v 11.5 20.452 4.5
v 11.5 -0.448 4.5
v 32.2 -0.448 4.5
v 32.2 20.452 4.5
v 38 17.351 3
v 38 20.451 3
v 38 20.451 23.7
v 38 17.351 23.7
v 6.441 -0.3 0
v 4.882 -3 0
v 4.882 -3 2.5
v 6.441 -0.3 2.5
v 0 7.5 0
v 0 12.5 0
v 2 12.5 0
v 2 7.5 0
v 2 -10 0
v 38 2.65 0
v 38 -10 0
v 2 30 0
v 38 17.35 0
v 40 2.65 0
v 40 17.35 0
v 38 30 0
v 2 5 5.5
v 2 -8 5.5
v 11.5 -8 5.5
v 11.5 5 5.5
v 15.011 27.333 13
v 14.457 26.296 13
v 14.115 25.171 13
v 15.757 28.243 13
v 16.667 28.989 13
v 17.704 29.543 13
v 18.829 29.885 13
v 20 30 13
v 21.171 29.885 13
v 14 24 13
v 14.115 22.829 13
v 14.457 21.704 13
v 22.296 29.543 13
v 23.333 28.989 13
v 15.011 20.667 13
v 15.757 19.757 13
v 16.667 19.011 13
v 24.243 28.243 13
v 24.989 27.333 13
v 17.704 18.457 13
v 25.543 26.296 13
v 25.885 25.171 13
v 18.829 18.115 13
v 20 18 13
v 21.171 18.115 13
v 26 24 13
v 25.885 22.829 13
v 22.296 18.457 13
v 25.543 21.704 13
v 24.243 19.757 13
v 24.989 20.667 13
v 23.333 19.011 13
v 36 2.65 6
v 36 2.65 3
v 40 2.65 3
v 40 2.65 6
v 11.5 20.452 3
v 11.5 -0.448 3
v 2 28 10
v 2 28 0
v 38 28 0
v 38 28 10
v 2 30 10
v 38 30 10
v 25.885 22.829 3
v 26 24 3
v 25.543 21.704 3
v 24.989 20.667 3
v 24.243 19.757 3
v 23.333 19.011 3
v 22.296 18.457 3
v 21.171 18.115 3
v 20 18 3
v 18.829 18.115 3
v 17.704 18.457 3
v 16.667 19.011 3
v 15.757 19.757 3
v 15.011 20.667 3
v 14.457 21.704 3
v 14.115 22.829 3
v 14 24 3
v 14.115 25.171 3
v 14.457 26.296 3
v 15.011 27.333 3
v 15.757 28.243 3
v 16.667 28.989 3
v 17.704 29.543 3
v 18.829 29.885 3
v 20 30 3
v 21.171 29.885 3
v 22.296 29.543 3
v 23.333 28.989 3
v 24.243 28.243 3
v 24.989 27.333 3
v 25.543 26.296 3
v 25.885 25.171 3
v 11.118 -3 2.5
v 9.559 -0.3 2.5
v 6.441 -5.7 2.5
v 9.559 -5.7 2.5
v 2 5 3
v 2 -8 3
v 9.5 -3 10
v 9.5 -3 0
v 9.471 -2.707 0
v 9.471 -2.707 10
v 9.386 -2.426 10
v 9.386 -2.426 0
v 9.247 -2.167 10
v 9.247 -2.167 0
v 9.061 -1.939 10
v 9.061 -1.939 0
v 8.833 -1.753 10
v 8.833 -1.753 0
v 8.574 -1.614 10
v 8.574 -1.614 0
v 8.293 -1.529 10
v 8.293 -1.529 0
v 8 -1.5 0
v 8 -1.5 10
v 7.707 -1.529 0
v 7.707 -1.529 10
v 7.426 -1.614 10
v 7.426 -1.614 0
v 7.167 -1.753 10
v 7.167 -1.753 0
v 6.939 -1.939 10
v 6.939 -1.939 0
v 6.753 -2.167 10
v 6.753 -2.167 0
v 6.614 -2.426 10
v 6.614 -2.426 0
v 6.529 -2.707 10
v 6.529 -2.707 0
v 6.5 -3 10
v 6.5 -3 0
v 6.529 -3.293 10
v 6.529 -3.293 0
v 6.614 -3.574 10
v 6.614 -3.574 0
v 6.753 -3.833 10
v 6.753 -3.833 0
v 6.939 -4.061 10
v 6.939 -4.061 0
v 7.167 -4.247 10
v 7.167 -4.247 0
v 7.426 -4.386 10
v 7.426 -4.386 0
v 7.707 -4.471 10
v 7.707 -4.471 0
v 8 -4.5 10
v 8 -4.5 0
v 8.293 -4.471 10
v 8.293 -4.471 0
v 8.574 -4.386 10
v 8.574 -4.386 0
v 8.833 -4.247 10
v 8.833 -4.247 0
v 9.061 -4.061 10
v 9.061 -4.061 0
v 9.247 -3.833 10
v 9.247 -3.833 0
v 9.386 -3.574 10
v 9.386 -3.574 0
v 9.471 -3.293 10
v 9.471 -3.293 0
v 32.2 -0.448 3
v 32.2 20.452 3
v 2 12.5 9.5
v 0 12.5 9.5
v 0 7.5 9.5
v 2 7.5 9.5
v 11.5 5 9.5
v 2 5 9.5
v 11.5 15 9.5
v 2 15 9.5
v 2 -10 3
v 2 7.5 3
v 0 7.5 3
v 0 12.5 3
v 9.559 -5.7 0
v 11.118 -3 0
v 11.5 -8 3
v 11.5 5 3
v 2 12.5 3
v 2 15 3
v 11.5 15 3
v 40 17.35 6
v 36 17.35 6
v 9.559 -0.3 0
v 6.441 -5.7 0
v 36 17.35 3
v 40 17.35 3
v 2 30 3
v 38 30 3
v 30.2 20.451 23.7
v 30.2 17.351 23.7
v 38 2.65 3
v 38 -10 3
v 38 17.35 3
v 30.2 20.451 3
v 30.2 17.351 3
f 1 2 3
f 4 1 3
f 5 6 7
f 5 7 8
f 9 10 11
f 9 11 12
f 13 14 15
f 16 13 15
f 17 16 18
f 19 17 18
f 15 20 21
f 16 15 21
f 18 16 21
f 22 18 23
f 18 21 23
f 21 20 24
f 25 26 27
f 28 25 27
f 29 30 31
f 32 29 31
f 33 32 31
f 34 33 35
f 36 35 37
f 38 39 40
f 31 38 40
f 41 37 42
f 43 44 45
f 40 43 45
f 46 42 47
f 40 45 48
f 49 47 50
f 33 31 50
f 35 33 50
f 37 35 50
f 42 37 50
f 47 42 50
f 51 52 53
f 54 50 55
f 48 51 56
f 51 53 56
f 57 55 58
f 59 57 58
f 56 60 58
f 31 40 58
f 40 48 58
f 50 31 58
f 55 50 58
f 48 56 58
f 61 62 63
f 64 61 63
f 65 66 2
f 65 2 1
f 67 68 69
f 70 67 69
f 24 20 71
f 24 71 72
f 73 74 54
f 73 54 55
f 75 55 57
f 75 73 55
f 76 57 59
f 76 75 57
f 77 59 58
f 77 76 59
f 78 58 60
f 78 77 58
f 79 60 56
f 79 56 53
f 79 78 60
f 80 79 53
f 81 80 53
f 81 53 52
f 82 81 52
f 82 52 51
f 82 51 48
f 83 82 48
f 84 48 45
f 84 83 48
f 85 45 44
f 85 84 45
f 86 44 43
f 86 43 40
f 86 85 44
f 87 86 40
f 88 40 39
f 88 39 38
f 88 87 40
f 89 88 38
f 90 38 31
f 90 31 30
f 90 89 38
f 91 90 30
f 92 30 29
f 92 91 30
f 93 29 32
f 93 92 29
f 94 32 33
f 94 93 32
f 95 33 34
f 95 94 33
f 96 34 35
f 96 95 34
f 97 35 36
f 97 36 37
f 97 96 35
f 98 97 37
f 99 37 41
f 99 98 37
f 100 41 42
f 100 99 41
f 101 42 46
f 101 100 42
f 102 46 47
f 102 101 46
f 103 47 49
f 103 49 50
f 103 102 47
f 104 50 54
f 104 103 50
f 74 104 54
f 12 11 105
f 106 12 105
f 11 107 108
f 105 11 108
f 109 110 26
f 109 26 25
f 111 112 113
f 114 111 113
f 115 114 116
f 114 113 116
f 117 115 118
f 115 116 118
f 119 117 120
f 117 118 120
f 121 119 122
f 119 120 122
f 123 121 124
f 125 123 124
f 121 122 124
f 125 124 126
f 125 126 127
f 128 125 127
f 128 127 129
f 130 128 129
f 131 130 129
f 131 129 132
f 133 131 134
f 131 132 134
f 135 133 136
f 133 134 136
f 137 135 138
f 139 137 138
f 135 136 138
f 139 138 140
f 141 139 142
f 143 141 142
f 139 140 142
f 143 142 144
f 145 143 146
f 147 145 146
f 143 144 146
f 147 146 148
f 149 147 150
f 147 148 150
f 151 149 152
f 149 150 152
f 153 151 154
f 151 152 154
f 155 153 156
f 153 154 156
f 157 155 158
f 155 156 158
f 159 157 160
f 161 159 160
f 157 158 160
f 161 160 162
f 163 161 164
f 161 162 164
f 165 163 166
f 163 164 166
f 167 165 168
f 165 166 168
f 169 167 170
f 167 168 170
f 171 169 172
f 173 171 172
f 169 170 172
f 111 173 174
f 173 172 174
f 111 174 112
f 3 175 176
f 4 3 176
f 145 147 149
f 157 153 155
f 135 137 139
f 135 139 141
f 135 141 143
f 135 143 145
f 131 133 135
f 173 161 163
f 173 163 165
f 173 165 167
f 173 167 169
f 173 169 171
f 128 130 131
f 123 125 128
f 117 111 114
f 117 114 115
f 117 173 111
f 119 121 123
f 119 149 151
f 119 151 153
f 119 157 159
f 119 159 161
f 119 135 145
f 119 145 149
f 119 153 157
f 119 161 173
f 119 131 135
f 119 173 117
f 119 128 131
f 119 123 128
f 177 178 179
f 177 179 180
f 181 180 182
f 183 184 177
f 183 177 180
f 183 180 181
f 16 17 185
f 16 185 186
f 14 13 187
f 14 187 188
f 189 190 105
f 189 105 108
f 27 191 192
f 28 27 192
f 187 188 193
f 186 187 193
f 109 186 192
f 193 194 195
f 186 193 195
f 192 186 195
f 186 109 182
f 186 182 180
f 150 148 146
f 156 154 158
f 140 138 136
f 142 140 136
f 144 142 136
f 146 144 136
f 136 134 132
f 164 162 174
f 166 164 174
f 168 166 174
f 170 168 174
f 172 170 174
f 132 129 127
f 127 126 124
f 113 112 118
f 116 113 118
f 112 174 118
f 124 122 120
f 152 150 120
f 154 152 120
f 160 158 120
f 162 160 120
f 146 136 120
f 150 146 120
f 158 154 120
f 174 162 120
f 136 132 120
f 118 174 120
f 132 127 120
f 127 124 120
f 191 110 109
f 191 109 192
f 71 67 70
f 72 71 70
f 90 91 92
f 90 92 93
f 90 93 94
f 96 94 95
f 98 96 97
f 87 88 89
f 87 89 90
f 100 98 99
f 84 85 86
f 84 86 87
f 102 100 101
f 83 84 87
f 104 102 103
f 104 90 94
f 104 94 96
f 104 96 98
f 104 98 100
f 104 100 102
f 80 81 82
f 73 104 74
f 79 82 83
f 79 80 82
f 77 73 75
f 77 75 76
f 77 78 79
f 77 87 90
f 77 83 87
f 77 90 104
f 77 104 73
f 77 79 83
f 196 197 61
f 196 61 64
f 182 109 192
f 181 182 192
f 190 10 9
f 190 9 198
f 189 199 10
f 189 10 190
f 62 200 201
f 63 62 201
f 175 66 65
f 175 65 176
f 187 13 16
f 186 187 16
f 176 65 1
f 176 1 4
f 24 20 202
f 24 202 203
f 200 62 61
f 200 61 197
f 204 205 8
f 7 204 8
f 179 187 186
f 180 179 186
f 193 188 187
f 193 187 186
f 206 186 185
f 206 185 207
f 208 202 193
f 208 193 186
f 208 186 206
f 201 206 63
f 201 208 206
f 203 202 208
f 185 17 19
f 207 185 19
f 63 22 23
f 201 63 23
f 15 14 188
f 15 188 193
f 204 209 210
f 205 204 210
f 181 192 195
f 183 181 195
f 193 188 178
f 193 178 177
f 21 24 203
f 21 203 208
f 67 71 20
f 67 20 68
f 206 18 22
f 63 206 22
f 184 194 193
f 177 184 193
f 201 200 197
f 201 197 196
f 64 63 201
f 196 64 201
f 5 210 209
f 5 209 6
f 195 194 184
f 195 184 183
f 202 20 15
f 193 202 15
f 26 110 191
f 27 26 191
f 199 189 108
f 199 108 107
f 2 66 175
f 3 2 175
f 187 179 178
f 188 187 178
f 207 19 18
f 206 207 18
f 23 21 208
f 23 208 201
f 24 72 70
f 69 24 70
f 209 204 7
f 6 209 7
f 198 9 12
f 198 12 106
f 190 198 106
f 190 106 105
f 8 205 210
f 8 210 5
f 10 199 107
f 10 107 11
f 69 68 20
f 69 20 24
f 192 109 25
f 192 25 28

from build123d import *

# Parameters (mm, degrees)
BOX002_W          = 2
BOX002_H          = 12.65
BOX002_DEPTH      = 10
BOX001_W          = 2
BOX001_H          = 17.5
BOX001_DEPTH      = 10
BOX_W             = 40
BOX_H             = 40
BOX_DEPTH         = 3
BOX003_W          = 4
BOX003_H          = 14.7
BOX003_DEPTH      = 3
BOX004_W          = 7.8
BOX004_H          = 3.1
BOX004_DEPTH      = 20.7
BOX006_W          = 2
BOX006_H          = 10
BOX006_DEPTH      = 10
BOX005_W          = 11.5
BOX005_H          = 10
BOX005_DEPTH      = 6.5
BOX007_W          = 20.7
BOX007_H          = 20.9
BOX007_DEPTH      = 1.5
CYLINDER_R        = 6
CYLINDER_DEPTH    = 10
CYLINDER001_R     = 1.5
CYLINDER001_DEPTH = 10
BOX008_W          = 36
BOX008_H          = 2
BOX008_DEPTH      = 10
BOX009_W          = 9.5
BOX009_H          = 13
BOX009_DEPTH      = 2.5
EXTRUDE_DEPTH     = 2.5


with BuildPart() as cube002:
    # Box002 → Box002 (new body)
    with BuildSketch(Plane(origin=(38, -10, 0), x_dir=(1, 0, 0), z_dir=(0, 0, 1))):
        with Locations((1, 6.325)):
            Rectangle(BOX002_W, BOX002_H)
    extrude(amount=BOX002_DEPTH)


with BuildPart() as part_mirroring001:
    # Part__Mirroring001: instance of Cube002
    add(cube002.part.mirror(Plane(origin=(0, 0, 0), x_dir=(1, 0, 0), z_dir=(0, 1, 0))))


with BuildPart() as part_mirroring001_1:
    # Part__Mirroring001 placement: moved
    add(part_mirroring001.part.moved(Location((0, 20, 0))))


with BuildPart() as cube001:
    # Box001 → Box001 (new body)
    with BuildSketch(Plane(origin=(0, -10, 0), x_dir=(1, 0, 0), z_dir=(0, 0, 1))):
        with Locations((1, 8.75)):
            Rectangle(BOX001_W, BOX001_H)
    extrude(amount=BOX001_DEPTH)


with BuildPart() as part_mirroring:
    # Part__Mirroring: instance of Cube001
    add(cube001.part.mirror(Plane(origin=(0, 0, 0), x_dir=(1, 0, 0), z_dir=(0, 1, 0))))


with BuildPart() as part_mirroring_1:
    # Part__Mirroring placement: moved
    add(part_mirroring.part.moved(Location((0, 20, 0))))


with BuildPart() as cut003:
    # Box → Box (new body)
    with BuildSketch(Plane(origin=(0, -10, 0), x_dir=(1, 0, 0), z_dir=(0, 0, 1))):
        with Locations((20, 20)):
            Rectangle(BOX_W, BOX_H)
    extrude(amount=BOX_DEPTH)

    # Cut: cut Part__Mirroring
    add(part_mirroring_1.part, mode=Mode.SUBTRACT)

    # Cut001: cut Cube001
    add(cube001.part, mode=Mode.SUBTRACT)

    # Cut002: cut Part__Mirroring001
    add(part_mirroring001_1.part, mode=Mode.SUBTRACT)

    # Cut003: cut Cube002
    add(cube002.part, mode=Mode.SUBTRACT)


with BuildPart() as cube003:
    # Box003 → Box003 (new body)
    with BuildSketch(Plane(origin=(36, 2.65, 3), x_dir=(1, 0, 0), z_dir=(0, 0, 1))):
        with Locations((2, 7.35)):
            Rectangle(BOX003_W, BOX003_H)
    extrude(amount=BOX003_DEPTH)


with BuildPart() as cube004:
    # Box004 → Box004 (new body)
    with BuildSketch(Plane(origin=(30.2, -0.450903, 3), x_dir=(1, 0, 0), z_dir=(0, 0, 1))):
        with Locations((3.9, 1.55)):
            Rectangle(BOX004_W, BOX004_H)
    extrude(amount=BOX004_DEPTH)


with BuildPart() as part_mirroring002:
    # Part__Mirroring002: instance of Cube004
    add(cube004.part.mirror(Plane(origin=(0, 0, 0), x_dir=(1, 0, 0), z_dir=(0, 1, 0))))


with BuildPart() as part_mirroring002_1:
    # Part__Mirroring002 placement: moved
    add(part_mirroring002.part.moved(Location((0, 20, 0))))


with BuildPart() as cube006:
    # Box006 → Box006 (new body)
    with BuildSketch(Plane(origin=(0, -2.5, 0), x_dir=(1, 0, 0), z_dir=(0, 0, 1))):
        with Locations((1, 5)):
            Rectangle(BOX006_W, BOX006_H)
    extrude(amount=BOX006_DEPTH)


with BuildPart() as part_mirroring003:
    # Part__Mirroring003: instance of Cube006
    add(cube006.part.mirror(Plane(origin=(0, 0, 0), x_dir=(1, 0, 0), z_dir=(0, 1, 0))))


with BuildPart() as part_mirroring003_1:
    # Part__Mirroring003 placement: moved
    add(part_mirroring003.part.moved(Location((0, 20, 0))))


with BuildPart() as cut005:
    # Box005 → Box005 (new body)
    with BuildSketch(Plane(origin=(0, 5, 3), x_dir=(1, 0, 0), z_dir=(0, 0, 1))):
        with Locations((5.75, 5)):
            Rectangle(BOX005_W, BOX005_H)
    extrude(amount=BOX005_DEPTH)

    # Cut004: cut Cube006
    add(cube006.part, mode=Mode.SUBTRACT)

    # Cut005: cut Part__Mirroring003
    add(part_mirroring003_1.part, mode=Mode.SUBTRACT)


with BuildPart() as cube007:
    # Box007 → Box007 (new body)
    with BuildSketch(Plane(origin=(11.5, -0.448498, 3), x_dir=(1, 0, 0), z_dir=(0, 0, 1))):
        with Locations((10.35, 10.45)):
            Rectangle(BOX007_W, BOX007_H)
    extrude(amount=BOX007_DEPTH)


with BuildPart() as cylinder:
    # Cylinder → Cylinder (new body)
    with BuildSketch(Plane(origin=(20, -4, 3), x_dir=(1, 0, 0), z_dir=(0, 0, 1))):
        Circle(CYLINDER_R)
    extrude(amount=CYLINDER_DEPTH)


with BuildPart() as part_mirroring004:
    # Part__Mirroring004: instance of Cylinder
    add(cylinder.part.mirror(Plane(origin=(0, 0, 0), x_dir=(1, 0, 0), z_dir=(0, 1, 0))))


with BuildPart() as part_mirroring004_1:
    # Part__Mirroring004 placement: moved
    add(part_mirroring004.part.moved(Location((0, 20, 0))))


with BuildPart() as cylinder001:
    # Cylinder001 → Cylinder001 (new body)
    with BuildSketch(Plane(origin=(8, -3, 0), x_dir=(1, 0, 0), z_dir=(0, 0, 1))):
        Circle(CYLINDER001_R)
    extrude(amount=CYLINDER001_DEPTH)


with BuildPart() as cube008:
    # Box008 → Box008 (new body)
    with BuildSketch(Plane(origin=(2, -10, 0), x_dir=(1, 0, 0), z_dir=(0, 0, 1))):
        with Locations((18, 1)):
            Rectangle(BOX008_W, BOX008_H)
    extrude(amount=BOX008_DEPTH)


with BuildPart() as cube008_mirrored:
    # mirror: instance of Cube008
    add(cube008.part.mirror(Plane(origin=(0, 10, 0), x_dir=(-1, 0, 0), z_dir=(0, -1, 0))))


with BuildPart() as cube009:
    # Box009 → Box009 (new body)
    with BuildSketch(Plane(origin=(2, -8, 3), x_dir=(1, 0, 0), z_dir=(0, 0, 1))):
        with Locations((4.75, 6.5)):
            Rectangle(BOX009_W, BOX009_H)
    extrude(amount=BOX009_DEPTH)


with BuildPart() as extrude_body:
    # Sketch (on Face3 of Cylinder001) → Extrude (new body)
    with BuildSketch(Plane(origin=(8, -3, 0), x_dir=(1, 0, 0), z_dir=(0, 0, -1))):
        Polygon((3.117691, 0), (1.558846, 2.7), (-1.558846, 2.7), (-3.117691, 0), (-1.558846, -2.7), (1.558846, -2.7), align=None)
    extrude(amount=-EXTRUDE_DEPTH)


solid = Compound([cut003.part, cube003.part, part_mirroring002_1.part, cut005.part, cube007.part, part_mirroring004_1.part, cylinder001.part, cube008_mirrored.part, cube009.part, extrude_body.part])
